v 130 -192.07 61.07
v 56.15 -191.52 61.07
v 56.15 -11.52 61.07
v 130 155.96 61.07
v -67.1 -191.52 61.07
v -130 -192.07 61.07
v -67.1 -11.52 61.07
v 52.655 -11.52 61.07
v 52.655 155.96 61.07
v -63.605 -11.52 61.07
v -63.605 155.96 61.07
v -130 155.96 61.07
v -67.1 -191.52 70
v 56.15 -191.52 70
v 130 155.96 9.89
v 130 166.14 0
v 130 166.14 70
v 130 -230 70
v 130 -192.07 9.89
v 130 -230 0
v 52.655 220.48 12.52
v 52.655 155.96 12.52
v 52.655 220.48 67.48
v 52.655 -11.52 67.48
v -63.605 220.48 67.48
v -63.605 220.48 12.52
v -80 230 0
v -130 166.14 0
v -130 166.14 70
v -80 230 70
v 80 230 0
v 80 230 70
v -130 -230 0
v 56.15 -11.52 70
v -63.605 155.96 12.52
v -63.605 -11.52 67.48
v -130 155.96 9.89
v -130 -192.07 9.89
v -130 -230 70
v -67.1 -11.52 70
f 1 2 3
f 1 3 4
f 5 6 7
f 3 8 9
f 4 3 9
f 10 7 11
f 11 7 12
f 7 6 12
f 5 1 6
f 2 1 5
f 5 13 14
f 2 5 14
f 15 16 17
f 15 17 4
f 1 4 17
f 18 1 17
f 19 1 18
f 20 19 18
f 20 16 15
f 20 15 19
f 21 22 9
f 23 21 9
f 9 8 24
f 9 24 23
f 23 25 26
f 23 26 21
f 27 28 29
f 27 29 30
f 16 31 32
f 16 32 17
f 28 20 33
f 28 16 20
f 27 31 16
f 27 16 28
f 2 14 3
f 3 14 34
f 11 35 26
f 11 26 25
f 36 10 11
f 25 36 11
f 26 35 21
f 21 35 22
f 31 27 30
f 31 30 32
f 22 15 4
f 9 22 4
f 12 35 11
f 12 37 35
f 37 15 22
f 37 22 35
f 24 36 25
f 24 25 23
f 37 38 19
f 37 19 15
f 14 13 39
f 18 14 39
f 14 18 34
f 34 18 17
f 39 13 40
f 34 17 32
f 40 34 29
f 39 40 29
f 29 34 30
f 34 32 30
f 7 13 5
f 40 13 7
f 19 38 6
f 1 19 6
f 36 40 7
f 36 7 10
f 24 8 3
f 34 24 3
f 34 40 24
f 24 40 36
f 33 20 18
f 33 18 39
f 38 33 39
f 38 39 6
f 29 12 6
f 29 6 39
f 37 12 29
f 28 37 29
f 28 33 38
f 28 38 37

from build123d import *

# Parameters (mm, degrees)
BOSS_EXTRUDE1_DEPTH = 70
SKETCH2_W           = 123.25
SKETCH2_H           = 180
CUT_EXTRUDE1_DEPTH  = 60
SKETCH3_W           = 116.2609192
SKETCH3_H           = 54.96046542
CUT_EXTRUDE2_DEPTH  = 232
SKETCH4_W           = 51.18
SKETCH4_H           = 348.03
CUT_EXTRUDE3_DEPTH  = 260


with BuildPart() as part:
    # Sketch1 → Boss-Extrude1 (new body)
    with BuildSketch(Plane.XY):
        Polygon((130, -230), (-130, -230), (-130, 166.14), (-80, 230), (80, 230), (130, 166.14), align=None)
    extrude(amount=BOSS_EXTRUDE1_DEPTH)

    # Sketch2 → Cut-Extrude1 (cut)
    with BuildSketch(Plane.XY.offset(70)):
        with Locations((-5.475, -101.52)):
            Rectangle(SKETCH2_W, SKETCH2_H)
    extrude(amount=-CUT_EXTRUDE1_DEPTH, mode=Mode.SUBTRACT)

    # Sketch3 → Cut-Extrude2 (cut)
    with BuildSketch(Plane.XZ.offset(11.52)):
        with Locations((-5.475, 40)):
            Rectangle(SKETCH3_W, SKETCH3_H)
    extrude(amount=-CUT_EXTRUDE2_DEPTH, mode=Mode.SUBTRACT)

    # Sketch4 → Cut-Extrude3 (cut)
    with BuildSketch(Plane.ZY.offset(130)):
        with Locations((35.48, -18.055)):
            Rectangle(SKETCH4_W, SKETCH4_H)
    extrude(amount=-CUT_EXTRUDE3_DEPTH, mode=Mode.SUBTRACT)


solid = part.part
